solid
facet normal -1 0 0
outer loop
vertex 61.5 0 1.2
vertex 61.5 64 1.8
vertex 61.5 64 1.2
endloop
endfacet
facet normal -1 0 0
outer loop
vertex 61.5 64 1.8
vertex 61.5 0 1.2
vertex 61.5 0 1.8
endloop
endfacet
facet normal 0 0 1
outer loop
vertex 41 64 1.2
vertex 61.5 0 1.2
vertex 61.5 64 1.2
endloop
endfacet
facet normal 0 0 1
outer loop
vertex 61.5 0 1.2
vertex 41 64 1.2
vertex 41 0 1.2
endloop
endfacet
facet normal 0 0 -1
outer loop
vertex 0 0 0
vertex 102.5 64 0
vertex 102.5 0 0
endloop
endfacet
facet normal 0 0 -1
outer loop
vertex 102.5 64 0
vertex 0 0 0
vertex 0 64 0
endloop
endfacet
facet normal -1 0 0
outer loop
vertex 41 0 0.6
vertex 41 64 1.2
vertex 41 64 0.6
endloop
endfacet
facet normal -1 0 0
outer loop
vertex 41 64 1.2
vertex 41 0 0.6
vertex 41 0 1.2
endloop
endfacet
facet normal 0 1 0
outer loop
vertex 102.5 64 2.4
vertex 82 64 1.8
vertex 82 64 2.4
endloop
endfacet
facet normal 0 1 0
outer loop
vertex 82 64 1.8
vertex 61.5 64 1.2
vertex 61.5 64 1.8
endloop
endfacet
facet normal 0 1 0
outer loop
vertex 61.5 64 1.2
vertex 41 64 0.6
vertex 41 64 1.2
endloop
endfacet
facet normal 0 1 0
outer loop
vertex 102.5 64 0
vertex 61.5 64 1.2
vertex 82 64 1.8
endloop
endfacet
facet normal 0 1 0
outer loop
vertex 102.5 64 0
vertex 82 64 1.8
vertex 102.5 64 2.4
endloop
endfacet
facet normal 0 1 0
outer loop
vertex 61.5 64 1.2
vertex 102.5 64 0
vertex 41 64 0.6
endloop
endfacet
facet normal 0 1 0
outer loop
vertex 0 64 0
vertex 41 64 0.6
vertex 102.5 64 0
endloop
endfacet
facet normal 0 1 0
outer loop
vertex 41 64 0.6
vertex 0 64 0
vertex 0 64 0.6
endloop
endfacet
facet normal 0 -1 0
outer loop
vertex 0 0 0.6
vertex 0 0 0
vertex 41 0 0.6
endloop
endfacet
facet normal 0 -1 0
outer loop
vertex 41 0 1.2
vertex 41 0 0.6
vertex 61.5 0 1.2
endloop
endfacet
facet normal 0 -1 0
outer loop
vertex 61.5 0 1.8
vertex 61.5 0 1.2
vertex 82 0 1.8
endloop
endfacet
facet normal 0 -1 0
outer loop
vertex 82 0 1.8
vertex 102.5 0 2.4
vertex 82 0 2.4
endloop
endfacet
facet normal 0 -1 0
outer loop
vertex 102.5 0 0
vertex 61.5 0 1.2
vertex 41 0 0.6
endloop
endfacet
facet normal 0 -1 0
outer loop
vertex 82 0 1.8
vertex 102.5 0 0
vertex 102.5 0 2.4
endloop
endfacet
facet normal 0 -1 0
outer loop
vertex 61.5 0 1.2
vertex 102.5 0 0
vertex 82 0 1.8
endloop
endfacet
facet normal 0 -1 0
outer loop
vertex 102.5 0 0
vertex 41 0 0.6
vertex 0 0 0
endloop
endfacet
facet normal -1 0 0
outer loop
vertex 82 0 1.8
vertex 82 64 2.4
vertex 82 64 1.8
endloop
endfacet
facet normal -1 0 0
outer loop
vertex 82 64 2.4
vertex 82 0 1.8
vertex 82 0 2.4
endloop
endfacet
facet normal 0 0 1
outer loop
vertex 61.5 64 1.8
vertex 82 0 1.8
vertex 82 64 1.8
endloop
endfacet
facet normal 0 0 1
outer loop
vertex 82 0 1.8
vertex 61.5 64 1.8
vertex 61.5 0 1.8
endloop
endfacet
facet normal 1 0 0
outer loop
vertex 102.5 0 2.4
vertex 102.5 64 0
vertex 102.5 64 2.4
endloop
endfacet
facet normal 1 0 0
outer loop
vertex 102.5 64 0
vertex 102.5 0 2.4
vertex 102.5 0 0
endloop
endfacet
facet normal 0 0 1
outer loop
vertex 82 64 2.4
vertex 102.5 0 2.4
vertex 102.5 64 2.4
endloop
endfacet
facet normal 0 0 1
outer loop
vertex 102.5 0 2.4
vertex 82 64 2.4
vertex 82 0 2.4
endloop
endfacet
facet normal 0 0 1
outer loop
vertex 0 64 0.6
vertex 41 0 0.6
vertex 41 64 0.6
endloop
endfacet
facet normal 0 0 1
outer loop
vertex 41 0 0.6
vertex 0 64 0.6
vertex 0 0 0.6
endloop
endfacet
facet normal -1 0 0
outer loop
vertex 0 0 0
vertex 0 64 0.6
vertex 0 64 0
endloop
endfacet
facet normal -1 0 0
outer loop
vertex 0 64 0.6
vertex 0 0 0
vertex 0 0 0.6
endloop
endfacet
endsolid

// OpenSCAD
insertTolerance = 1;

cardWidth = 41;
cardDepth = 64;
widthOffsetPercent = .5;
depthOffsetPercent = .55;
offsetCardWidth = cardWidth*widthOffsetPercent;
offsetCardDepth = cardDepth*depthOffsetPercent;
cardHeight = .3;
stepHeight = 2*cardHeight;

function getColor(number) = [.2*number, 0*number, .2*number,];

module damageInsert (
  numberOfCards,
  direction = "depth"
) {
  cube([cardWidth, cardDepth, stepHeight]);

  numberOfAdditionalCards = numberOfCards - 1;
  for (i = [1: numberOfAdditionalCards]) {
    color(getColor(i))
    if (direction == "depth") {
      translate([0, cardDepth + (i - 1)*offsetCardDepth, 0])
      cube([cardWidth, offsetCardDepth, (i+1)*stepHeight]);
    } else {
      translate([cardWidth + (i - 1)*offsetCardWidth, 0, 0])
      cube([offsetCardWidth, cardDepth, (i+1)*stepHeight]);
    }
  }

  if (direction == "depth") {
    totalWidth = cardWidth + insertTolerance;
    totalDepth = cardDepth + numberOfAdditionalCards*offsetCardDepth + insertTolerance;
    totalHeight = (numberOfCards + 1)*stepHeight + insertTolerance;
    echo("Min Outer Dimensions", totalWidth, totalDepth, totalHeight);
  } else {
    totalWidth = cardWidth + numberOfAdditionalCards*offsetCardWidth + insertTolerance;
    totalDepth = cardDepth + insertTolerance;
    totalHeight = (numberOfCards + 1)*stepHeight + insertTolerance;
    echo("Min Outer Dimensions", totalWidth, totalDepth, totalHeight);
  }
}

damageInsert(4, "width");
